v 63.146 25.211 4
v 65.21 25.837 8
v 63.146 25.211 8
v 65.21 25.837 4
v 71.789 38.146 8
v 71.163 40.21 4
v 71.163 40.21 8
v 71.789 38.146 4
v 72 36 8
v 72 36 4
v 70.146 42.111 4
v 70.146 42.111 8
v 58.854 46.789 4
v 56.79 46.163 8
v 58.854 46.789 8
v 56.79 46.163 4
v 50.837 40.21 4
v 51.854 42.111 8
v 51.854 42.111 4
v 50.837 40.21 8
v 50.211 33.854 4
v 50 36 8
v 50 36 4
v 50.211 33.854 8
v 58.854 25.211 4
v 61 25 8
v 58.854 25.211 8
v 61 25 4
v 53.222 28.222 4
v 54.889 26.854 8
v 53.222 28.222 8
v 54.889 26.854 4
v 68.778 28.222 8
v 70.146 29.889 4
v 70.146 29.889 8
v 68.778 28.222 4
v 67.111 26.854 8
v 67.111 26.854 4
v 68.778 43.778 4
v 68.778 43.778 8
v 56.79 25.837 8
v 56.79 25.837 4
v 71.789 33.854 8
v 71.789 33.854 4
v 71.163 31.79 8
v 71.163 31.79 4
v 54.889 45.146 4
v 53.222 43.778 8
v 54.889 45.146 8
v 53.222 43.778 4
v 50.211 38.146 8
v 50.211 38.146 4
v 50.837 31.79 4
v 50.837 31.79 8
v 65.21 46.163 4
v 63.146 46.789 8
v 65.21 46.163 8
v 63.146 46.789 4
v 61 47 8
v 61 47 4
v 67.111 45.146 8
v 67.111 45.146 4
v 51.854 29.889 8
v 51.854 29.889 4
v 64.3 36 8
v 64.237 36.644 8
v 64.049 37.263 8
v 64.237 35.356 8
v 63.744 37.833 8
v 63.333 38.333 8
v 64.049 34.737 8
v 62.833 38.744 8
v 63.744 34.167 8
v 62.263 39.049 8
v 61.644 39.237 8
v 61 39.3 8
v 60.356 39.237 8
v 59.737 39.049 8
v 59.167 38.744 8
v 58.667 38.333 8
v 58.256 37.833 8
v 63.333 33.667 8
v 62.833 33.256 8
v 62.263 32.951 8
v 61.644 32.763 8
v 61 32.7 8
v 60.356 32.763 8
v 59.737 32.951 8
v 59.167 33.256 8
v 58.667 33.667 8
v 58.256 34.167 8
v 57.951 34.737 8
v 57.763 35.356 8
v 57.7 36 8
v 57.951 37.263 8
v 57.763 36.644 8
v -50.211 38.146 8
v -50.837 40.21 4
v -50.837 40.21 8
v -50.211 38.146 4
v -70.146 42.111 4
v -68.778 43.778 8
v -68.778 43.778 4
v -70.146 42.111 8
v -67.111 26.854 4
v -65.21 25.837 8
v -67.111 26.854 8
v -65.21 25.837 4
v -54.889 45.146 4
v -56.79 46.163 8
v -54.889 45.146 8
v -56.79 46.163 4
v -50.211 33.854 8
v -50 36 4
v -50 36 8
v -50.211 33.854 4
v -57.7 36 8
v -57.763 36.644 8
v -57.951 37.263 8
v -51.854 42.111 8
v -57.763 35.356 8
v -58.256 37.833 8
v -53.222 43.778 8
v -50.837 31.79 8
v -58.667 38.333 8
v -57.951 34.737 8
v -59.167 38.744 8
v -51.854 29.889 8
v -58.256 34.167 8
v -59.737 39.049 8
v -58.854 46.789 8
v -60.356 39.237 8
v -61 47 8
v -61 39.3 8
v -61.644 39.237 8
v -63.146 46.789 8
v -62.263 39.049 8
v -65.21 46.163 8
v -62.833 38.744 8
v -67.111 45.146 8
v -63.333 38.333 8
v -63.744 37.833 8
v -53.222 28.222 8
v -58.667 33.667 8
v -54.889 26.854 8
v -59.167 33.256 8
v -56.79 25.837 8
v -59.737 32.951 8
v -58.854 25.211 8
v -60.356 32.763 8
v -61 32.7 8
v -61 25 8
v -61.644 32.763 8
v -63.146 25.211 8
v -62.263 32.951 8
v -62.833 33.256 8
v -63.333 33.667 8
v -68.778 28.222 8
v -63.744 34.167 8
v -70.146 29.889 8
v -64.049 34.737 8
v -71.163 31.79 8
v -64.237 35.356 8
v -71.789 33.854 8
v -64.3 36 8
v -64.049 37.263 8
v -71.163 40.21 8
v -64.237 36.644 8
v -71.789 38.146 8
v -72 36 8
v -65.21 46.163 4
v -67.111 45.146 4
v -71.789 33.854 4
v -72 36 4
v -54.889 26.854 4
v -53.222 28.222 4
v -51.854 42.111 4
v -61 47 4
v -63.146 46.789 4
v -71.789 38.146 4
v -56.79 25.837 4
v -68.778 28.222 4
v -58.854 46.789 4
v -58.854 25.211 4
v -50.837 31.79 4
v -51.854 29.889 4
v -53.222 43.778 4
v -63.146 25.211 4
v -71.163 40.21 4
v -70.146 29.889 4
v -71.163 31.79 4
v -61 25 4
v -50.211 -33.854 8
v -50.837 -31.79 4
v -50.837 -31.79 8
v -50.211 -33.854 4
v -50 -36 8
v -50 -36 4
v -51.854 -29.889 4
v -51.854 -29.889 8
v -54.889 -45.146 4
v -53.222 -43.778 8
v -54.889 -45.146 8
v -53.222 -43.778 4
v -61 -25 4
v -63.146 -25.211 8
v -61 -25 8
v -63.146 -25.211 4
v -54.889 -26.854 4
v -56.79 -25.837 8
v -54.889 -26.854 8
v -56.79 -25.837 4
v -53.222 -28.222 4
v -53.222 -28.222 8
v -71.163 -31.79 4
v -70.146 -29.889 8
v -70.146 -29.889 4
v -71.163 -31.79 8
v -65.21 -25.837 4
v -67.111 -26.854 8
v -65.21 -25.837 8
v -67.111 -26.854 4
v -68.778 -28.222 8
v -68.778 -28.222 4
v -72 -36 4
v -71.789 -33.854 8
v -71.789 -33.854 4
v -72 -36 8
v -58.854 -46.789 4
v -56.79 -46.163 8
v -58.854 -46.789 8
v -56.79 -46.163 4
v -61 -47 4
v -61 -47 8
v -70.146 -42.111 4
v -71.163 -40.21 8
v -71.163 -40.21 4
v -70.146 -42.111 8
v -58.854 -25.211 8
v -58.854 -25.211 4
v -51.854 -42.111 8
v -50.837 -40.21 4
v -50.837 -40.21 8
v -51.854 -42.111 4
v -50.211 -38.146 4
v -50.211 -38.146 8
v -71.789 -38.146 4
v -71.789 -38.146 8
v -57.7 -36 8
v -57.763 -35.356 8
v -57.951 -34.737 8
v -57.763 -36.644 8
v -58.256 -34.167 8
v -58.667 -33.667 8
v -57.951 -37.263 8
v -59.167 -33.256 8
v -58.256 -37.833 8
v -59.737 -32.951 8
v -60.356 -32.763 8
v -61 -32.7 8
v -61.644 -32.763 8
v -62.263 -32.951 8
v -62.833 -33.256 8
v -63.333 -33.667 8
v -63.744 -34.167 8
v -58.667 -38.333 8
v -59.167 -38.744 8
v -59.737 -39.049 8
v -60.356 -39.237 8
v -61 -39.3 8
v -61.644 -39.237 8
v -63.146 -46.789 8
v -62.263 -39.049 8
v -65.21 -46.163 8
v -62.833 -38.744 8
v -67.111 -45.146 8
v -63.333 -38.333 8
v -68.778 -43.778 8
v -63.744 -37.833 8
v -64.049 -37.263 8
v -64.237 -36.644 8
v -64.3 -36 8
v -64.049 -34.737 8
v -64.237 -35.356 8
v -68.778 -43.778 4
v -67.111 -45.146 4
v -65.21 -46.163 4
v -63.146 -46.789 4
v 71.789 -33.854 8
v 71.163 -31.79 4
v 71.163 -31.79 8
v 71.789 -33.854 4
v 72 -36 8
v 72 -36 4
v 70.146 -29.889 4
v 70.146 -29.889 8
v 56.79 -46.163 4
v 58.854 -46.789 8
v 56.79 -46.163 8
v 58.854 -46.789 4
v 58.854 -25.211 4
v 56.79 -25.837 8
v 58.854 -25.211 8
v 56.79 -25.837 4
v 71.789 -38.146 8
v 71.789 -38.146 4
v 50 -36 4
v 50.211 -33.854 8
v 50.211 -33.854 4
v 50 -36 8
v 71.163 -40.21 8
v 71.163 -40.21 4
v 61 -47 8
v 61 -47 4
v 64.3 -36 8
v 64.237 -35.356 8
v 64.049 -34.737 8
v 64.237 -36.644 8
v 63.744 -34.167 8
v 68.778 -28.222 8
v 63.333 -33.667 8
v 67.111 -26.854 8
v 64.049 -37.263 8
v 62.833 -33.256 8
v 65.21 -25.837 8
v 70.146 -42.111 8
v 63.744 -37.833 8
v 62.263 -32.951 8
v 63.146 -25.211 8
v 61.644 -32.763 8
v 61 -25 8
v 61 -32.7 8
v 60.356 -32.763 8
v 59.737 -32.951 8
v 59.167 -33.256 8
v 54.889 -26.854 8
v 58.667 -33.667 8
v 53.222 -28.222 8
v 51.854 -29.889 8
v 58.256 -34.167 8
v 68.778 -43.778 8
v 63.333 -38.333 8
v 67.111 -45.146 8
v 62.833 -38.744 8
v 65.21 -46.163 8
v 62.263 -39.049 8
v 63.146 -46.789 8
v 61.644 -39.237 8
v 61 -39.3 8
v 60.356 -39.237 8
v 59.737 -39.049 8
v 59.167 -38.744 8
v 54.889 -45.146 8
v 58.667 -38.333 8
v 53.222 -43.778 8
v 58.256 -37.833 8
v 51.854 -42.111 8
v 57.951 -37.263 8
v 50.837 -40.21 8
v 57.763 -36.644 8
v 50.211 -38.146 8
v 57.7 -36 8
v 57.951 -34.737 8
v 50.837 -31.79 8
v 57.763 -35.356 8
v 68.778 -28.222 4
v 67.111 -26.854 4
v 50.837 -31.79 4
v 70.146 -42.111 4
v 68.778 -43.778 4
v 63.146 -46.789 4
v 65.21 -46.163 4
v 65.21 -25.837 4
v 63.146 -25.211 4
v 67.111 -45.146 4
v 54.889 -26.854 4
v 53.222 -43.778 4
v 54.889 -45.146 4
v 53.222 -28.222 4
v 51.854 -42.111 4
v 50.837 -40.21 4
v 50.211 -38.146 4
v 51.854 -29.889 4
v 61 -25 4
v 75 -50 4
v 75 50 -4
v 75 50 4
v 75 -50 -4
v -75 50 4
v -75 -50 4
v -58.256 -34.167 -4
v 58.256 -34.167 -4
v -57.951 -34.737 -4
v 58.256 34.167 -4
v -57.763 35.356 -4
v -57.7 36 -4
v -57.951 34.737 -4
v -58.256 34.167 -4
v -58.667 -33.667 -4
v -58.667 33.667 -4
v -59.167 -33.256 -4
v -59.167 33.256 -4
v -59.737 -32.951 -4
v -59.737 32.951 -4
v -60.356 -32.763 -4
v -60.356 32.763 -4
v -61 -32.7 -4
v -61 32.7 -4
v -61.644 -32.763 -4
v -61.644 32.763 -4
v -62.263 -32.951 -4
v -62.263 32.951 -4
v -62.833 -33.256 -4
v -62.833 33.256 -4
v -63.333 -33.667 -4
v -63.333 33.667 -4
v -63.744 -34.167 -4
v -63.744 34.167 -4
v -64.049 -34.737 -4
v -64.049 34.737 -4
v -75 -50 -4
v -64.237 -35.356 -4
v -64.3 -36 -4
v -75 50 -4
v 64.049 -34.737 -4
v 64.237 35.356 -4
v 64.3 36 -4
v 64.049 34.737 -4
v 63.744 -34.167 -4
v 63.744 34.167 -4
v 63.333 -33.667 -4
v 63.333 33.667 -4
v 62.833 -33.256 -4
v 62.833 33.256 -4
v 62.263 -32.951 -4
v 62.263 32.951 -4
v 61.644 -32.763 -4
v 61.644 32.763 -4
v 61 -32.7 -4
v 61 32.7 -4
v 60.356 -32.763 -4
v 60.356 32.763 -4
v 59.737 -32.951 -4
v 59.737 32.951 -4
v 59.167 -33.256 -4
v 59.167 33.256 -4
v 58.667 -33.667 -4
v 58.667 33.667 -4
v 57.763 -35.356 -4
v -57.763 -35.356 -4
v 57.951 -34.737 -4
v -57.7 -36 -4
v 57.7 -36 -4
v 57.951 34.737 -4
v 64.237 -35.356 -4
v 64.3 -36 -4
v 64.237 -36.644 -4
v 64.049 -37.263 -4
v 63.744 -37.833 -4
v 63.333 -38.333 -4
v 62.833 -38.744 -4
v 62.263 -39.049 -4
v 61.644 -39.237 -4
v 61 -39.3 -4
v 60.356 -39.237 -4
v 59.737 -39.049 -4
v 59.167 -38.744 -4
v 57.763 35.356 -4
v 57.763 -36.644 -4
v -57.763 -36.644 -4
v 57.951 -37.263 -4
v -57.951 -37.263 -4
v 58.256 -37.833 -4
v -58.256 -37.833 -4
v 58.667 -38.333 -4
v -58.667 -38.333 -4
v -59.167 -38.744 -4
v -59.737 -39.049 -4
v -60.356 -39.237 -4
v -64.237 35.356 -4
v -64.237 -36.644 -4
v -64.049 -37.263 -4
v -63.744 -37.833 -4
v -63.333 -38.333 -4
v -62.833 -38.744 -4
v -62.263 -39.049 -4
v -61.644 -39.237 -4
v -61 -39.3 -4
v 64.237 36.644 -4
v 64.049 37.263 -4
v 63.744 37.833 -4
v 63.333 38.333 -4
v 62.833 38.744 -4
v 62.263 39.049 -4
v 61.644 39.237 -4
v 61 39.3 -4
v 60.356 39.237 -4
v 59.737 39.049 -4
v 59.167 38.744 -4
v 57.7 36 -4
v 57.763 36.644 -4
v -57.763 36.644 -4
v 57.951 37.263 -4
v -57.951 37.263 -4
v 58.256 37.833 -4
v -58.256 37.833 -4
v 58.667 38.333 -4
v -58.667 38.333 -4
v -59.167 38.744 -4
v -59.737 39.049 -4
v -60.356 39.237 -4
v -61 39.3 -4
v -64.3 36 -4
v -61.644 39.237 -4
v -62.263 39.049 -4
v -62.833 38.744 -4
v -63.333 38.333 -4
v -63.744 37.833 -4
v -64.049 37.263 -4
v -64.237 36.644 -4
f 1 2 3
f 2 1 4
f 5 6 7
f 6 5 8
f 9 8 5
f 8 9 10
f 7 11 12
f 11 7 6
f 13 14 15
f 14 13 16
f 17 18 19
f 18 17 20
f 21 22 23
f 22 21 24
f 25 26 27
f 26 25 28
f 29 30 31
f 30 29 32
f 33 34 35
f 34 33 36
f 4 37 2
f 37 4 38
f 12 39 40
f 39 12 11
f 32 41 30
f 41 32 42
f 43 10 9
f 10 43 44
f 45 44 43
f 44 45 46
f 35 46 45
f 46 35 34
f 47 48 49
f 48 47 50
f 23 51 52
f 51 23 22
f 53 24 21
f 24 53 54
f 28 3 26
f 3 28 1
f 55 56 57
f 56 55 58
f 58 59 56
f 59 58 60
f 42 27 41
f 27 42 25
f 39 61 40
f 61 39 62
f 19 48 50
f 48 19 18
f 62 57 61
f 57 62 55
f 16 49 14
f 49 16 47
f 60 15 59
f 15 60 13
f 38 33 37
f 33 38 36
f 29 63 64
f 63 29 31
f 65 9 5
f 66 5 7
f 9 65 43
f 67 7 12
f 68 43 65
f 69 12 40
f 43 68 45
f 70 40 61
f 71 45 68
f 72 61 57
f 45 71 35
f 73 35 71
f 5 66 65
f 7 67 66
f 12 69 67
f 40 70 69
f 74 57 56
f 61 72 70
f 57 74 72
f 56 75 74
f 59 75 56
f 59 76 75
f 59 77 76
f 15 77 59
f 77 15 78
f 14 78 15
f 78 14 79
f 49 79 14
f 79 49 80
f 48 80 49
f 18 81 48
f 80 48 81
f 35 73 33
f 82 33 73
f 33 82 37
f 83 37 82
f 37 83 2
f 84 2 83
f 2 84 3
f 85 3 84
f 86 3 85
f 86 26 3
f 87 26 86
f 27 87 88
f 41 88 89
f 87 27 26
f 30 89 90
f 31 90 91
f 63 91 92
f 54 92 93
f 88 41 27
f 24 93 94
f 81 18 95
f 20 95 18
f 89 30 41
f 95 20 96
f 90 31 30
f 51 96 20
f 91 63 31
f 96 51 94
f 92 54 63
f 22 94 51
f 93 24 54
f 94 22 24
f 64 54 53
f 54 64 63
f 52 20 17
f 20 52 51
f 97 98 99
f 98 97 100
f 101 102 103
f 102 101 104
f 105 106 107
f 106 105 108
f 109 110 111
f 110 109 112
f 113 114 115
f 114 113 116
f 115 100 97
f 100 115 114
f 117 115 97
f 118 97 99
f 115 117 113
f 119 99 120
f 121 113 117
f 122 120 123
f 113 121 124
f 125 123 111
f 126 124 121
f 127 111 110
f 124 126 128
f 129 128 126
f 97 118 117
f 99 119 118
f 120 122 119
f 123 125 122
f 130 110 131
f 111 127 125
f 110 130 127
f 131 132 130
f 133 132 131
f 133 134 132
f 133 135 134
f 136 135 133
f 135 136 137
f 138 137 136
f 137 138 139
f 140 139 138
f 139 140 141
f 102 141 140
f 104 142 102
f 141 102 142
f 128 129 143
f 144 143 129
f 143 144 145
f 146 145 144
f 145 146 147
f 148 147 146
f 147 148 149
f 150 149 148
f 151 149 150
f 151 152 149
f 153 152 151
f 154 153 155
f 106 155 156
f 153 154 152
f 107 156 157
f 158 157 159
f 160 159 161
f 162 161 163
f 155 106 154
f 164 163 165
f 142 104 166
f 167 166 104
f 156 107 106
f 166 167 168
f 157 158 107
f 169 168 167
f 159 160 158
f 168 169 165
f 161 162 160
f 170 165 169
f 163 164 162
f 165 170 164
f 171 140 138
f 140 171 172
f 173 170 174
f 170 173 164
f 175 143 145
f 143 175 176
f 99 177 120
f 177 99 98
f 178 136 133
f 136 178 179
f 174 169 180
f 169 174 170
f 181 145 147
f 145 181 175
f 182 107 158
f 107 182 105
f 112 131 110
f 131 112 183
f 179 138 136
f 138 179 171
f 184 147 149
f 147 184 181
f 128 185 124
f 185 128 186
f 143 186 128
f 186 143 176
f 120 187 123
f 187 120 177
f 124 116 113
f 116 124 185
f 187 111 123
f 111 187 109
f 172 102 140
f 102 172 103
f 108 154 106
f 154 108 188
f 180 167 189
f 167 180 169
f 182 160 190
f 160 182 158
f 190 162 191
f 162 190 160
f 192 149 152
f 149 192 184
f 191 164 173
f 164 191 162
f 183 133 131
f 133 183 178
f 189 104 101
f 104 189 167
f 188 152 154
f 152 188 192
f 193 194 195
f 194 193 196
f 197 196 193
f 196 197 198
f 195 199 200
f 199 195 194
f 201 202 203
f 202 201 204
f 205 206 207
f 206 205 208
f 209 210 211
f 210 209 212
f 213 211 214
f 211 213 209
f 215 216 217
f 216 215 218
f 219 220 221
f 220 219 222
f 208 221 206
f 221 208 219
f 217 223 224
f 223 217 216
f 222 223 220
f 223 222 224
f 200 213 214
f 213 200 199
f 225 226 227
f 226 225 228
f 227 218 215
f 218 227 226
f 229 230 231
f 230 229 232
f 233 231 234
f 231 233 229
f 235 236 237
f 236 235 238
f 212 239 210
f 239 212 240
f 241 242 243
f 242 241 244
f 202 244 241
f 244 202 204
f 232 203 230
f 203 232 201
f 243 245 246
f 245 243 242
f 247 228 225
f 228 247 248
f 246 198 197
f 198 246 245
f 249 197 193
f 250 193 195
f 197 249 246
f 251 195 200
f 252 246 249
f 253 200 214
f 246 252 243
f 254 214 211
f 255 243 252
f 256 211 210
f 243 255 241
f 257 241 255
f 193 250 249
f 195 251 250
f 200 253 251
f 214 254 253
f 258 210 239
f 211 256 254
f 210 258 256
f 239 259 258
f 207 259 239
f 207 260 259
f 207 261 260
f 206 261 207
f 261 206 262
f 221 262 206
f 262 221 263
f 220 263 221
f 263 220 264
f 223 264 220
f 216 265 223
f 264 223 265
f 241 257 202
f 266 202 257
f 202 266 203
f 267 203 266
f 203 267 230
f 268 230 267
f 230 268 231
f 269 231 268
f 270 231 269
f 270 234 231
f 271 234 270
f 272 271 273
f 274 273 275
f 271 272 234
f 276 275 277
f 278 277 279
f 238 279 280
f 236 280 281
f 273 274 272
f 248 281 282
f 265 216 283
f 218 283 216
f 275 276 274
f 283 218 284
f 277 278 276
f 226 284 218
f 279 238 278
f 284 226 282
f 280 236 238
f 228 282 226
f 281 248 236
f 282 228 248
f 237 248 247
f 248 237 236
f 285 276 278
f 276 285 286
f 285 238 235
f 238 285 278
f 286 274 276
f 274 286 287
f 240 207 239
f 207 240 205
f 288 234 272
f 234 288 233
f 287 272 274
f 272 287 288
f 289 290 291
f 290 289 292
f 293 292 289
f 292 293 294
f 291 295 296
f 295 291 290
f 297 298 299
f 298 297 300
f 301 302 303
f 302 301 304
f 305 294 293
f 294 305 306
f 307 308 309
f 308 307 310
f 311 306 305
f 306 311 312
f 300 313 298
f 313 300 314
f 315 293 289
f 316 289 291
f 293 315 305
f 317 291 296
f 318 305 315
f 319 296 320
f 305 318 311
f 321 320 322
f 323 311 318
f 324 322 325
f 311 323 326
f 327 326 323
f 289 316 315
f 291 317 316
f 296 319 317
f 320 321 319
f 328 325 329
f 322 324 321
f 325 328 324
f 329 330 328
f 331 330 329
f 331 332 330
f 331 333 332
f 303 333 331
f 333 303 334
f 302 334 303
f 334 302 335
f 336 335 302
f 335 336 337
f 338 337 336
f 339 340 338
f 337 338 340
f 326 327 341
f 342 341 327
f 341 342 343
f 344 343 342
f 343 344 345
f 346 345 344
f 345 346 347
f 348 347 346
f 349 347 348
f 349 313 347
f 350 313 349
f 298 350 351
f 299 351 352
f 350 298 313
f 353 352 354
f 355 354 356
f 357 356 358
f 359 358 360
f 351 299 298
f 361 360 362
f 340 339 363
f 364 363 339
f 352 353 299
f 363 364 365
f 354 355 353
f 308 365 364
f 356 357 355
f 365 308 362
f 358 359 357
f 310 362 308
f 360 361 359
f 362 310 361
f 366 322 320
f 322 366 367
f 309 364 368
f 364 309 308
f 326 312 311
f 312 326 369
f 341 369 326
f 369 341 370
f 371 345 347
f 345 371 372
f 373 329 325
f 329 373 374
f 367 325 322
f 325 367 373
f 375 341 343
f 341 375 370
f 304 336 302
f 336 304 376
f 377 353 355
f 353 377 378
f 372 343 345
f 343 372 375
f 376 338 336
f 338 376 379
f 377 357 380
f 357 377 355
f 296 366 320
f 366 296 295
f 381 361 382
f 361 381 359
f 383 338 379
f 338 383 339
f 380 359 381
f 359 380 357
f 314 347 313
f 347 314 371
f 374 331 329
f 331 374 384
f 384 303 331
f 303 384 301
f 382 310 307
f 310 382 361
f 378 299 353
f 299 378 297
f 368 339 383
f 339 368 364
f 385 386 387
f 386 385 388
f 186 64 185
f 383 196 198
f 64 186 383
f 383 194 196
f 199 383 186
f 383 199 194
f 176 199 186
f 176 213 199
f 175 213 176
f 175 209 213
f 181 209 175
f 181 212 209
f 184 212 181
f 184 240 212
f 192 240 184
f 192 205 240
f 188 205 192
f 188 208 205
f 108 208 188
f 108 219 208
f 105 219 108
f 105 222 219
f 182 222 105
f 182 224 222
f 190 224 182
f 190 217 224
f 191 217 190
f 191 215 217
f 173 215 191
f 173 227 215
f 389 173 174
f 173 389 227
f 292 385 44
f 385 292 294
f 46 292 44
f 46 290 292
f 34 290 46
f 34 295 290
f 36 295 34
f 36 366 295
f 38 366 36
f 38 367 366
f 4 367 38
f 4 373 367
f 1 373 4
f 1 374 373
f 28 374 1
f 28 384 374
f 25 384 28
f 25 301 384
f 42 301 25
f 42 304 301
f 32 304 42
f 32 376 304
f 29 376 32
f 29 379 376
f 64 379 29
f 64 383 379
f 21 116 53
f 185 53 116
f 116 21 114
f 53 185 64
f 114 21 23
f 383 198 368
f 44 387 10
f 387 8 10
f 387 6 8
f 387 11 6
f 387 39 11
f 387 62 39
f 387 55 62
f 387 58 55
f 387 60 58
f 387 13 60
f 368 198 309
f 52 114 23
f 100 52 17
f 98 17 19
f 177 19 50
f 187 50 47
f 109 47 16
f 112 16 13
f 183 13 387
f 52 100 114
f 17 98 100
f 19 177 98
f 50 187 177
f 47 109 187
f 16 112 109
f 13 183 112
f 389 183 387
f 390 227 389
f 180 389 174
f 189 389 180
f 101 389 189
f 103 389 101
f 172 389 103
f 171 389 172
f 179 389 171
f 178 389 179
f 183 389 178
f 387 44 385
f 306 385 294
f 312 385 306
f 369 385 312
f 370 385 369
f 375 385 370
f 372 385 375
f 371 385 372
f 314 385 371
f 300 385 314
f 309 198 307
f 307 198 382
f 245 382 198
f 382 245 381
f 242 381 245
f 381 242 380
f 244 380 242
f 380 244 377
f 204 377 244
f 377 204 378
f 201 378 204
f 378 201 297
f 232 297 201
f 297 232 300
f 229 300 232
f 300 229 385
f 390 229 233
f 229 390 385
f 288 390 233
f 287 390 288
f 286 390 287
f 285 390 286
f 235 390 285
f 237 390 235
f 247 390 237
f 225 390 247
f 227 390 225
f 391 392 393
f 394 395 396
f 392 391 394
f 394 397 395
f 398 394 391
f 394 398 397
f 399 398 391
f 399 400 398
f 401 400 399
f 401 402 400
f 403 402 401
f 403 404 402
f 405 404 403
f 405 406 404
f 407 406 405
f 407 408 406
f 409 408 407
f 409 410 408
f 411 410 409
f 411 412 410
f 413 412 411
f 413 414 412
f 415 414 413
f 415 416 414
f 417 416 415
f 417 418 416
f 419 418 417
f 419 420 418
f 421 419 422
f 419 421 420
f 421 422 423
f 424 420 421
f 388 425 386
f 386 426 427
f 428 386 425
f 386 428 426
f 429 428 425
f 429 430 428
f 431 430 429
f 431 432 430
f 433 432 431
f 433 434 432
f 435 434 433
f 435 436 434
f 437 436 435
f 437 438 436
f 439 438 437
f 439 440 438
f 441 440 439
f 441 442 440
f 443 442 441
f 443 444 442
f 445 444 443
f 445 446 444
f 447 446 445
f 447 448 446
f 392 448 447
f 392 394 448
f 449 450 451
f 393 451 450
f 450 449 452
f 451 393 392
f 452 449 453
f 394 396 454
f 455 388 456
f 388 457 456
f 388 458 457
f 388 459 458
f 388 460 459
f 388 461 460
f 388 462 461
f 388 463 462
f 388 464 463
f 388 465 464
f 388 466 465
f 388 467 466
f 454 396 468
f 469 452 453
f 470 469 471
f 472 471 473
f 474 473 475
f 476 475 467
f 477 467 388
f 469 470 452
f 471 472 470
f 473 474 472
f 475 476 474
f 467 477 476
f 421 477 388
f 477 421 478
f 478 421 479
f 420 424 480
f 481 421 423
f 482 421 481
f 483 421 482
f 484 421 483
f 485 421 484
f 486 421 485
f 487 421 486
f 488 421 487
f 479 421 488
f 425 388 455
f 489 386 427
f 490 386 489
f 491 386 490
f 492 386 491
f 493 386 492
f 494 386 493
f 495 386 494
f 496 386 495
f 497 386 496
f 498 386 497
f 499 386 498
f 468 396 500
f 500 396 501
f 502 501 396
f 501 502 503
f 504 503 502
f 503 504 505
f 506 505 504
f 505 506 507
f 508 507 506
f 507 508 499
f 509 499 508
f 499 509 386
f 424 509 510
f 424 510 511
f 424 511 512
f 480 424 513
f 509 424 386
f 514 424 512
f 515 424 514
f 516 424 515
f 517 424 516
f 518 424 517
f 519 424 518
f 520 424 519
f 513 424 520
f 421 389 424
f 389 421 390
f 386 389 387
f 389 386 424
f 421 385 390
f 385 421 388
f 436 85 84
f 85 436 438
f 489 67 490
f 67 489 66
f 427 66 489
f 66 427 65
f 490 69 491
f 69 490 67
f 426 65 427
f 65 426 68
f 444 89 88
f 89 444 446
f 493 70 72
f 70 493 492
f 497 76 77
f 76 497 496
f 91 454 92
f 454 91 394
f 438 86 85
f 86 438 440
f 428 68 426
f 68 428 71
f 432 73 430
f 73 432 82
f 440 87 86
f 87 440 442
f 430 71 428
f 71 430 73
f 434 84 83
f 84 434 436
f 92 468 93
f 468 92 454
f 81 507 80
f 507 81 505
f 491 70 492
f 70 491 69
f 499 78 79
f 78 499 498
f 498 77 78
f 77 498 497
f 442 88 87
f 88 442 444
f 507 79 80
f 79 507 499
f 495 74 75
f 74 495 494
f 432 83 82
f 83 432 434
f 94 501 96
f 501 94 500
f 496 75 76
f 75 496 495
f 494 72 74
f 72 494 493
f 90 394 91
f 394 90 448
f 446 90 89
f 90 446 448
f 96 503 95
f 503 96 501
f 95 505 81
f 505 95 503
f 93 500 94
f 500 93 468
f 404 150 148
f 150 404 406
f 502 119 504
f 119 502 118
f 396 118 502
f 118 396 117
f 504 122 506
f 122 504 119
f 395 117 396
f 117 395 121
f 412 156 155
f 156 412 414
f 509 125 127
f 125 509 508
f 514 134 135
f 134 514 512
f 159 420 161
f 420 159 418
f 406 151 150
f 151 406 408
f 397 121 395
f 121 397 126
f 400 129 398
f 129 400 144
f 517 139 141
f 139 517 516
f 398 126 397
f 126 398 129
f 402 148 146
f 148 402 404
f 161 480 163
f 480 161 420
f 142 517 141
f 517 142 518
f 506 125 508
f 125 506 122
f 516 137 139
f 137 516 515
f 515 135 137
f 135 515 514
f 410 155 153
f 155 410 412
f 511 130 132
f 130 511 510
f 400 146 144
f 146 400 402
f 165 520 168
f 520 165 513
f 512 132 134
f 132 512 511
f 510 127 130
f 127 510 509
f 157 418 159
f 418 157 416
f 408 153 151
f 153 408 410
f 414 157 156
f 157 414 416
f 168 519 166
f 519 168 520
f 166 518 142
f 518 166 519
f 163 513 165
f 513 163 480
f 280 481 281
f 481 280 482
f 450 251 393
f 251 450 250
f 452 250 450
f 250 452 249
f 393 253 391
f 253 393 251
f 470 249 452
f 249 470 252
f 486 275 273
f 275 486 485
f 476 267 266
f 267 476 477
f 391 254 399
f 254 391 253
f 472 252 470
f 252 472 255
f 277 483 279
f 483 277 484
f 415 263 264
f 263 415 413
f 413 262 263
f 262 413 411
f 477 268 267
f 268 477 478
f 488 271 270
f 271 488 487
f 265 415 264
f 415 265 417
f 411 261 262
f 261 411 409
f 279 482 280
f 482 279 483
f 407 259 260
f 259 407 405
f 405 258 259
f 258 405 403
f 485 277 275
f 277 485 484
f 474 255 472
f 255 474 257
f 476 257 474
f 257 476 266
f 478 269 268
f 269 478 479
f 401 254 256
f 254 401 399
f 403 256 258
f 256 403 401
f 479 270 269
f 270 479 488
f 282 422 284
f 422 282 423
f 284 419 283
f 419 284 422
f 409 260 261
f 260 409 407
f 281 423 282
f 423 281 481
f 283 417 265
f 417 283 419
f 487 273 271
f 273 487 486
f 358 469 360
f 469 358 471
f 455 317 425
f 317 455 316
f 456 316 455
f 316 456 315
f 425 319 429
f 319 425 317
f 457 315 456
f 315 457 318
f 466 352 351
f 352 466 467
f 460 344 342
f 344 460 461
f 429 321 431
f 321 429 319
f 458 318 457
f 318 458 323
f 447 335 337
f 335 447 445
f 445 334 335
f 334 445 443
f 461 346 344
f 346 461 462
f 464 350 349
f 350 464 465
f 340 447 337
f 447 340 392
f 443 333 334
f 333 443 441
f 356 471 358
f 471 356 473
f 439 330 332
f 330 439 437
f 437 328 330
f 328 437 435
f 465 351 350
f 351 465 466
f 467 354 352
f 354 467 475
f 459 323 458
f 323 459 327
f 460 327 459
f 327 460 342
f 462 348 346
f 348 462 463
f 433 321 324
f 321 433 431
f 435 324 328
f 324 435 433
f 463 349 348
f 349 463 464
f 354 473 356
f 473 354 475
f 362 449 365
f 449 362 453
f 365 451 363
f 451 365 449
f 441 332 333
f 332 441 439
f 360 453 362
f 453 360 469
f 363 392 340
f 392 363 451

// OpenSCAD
$fn = 32;

// ----------------------------------------------------------------------
// Anchor pads 150 x 100 x 12
// four corner bosses with anchor holes
// ----------------------------------------------------------------------

// --- parameters (mm) ---
plate = [150, 100, 8];  // base plate size (x, y, z)
pads = 4;               // boss count, one per corner
edge = 14;              // boss centre offset from the plate edge
boss_d = 22;            // boss diameter
boss_h = 4;             // boss height above the base plate
hole_d = 6.6;           // hole diameter

// --- derived feature positions (mm) ---
height = plate[2] + boss_h;      // = 12   overall height of the part
corner_x = plate[0] / 2 - edge;  // = 61   boss centre X
corner_y = plate[1] / 2 - edge;  // = 36   boss centre Y
feature_centers = [
  [corner_x, corner_y],
  [-corner_x, corner_y],
  [-corner_x, -corner_y],
  [corner_x, -corner_y]
];   // boss centres, anchor holes are drilled there

// base plate, four bosses standing on it, anchor holes all the way through
difference() {
  union() {
    cube(plate, center = true);
    for (centre = feature_centers)
      translate([centre[0], centre[1], plate[2] / 2 - 1])
        cylinder(d = boss_d, h = boss_h + 1);
  }
  for (centre = feature_centers)
    translate([centre[0], centre[1], -height])
      cylinder(d = hole_d, h = 2 * height + 2);  // through boss and plate
}
